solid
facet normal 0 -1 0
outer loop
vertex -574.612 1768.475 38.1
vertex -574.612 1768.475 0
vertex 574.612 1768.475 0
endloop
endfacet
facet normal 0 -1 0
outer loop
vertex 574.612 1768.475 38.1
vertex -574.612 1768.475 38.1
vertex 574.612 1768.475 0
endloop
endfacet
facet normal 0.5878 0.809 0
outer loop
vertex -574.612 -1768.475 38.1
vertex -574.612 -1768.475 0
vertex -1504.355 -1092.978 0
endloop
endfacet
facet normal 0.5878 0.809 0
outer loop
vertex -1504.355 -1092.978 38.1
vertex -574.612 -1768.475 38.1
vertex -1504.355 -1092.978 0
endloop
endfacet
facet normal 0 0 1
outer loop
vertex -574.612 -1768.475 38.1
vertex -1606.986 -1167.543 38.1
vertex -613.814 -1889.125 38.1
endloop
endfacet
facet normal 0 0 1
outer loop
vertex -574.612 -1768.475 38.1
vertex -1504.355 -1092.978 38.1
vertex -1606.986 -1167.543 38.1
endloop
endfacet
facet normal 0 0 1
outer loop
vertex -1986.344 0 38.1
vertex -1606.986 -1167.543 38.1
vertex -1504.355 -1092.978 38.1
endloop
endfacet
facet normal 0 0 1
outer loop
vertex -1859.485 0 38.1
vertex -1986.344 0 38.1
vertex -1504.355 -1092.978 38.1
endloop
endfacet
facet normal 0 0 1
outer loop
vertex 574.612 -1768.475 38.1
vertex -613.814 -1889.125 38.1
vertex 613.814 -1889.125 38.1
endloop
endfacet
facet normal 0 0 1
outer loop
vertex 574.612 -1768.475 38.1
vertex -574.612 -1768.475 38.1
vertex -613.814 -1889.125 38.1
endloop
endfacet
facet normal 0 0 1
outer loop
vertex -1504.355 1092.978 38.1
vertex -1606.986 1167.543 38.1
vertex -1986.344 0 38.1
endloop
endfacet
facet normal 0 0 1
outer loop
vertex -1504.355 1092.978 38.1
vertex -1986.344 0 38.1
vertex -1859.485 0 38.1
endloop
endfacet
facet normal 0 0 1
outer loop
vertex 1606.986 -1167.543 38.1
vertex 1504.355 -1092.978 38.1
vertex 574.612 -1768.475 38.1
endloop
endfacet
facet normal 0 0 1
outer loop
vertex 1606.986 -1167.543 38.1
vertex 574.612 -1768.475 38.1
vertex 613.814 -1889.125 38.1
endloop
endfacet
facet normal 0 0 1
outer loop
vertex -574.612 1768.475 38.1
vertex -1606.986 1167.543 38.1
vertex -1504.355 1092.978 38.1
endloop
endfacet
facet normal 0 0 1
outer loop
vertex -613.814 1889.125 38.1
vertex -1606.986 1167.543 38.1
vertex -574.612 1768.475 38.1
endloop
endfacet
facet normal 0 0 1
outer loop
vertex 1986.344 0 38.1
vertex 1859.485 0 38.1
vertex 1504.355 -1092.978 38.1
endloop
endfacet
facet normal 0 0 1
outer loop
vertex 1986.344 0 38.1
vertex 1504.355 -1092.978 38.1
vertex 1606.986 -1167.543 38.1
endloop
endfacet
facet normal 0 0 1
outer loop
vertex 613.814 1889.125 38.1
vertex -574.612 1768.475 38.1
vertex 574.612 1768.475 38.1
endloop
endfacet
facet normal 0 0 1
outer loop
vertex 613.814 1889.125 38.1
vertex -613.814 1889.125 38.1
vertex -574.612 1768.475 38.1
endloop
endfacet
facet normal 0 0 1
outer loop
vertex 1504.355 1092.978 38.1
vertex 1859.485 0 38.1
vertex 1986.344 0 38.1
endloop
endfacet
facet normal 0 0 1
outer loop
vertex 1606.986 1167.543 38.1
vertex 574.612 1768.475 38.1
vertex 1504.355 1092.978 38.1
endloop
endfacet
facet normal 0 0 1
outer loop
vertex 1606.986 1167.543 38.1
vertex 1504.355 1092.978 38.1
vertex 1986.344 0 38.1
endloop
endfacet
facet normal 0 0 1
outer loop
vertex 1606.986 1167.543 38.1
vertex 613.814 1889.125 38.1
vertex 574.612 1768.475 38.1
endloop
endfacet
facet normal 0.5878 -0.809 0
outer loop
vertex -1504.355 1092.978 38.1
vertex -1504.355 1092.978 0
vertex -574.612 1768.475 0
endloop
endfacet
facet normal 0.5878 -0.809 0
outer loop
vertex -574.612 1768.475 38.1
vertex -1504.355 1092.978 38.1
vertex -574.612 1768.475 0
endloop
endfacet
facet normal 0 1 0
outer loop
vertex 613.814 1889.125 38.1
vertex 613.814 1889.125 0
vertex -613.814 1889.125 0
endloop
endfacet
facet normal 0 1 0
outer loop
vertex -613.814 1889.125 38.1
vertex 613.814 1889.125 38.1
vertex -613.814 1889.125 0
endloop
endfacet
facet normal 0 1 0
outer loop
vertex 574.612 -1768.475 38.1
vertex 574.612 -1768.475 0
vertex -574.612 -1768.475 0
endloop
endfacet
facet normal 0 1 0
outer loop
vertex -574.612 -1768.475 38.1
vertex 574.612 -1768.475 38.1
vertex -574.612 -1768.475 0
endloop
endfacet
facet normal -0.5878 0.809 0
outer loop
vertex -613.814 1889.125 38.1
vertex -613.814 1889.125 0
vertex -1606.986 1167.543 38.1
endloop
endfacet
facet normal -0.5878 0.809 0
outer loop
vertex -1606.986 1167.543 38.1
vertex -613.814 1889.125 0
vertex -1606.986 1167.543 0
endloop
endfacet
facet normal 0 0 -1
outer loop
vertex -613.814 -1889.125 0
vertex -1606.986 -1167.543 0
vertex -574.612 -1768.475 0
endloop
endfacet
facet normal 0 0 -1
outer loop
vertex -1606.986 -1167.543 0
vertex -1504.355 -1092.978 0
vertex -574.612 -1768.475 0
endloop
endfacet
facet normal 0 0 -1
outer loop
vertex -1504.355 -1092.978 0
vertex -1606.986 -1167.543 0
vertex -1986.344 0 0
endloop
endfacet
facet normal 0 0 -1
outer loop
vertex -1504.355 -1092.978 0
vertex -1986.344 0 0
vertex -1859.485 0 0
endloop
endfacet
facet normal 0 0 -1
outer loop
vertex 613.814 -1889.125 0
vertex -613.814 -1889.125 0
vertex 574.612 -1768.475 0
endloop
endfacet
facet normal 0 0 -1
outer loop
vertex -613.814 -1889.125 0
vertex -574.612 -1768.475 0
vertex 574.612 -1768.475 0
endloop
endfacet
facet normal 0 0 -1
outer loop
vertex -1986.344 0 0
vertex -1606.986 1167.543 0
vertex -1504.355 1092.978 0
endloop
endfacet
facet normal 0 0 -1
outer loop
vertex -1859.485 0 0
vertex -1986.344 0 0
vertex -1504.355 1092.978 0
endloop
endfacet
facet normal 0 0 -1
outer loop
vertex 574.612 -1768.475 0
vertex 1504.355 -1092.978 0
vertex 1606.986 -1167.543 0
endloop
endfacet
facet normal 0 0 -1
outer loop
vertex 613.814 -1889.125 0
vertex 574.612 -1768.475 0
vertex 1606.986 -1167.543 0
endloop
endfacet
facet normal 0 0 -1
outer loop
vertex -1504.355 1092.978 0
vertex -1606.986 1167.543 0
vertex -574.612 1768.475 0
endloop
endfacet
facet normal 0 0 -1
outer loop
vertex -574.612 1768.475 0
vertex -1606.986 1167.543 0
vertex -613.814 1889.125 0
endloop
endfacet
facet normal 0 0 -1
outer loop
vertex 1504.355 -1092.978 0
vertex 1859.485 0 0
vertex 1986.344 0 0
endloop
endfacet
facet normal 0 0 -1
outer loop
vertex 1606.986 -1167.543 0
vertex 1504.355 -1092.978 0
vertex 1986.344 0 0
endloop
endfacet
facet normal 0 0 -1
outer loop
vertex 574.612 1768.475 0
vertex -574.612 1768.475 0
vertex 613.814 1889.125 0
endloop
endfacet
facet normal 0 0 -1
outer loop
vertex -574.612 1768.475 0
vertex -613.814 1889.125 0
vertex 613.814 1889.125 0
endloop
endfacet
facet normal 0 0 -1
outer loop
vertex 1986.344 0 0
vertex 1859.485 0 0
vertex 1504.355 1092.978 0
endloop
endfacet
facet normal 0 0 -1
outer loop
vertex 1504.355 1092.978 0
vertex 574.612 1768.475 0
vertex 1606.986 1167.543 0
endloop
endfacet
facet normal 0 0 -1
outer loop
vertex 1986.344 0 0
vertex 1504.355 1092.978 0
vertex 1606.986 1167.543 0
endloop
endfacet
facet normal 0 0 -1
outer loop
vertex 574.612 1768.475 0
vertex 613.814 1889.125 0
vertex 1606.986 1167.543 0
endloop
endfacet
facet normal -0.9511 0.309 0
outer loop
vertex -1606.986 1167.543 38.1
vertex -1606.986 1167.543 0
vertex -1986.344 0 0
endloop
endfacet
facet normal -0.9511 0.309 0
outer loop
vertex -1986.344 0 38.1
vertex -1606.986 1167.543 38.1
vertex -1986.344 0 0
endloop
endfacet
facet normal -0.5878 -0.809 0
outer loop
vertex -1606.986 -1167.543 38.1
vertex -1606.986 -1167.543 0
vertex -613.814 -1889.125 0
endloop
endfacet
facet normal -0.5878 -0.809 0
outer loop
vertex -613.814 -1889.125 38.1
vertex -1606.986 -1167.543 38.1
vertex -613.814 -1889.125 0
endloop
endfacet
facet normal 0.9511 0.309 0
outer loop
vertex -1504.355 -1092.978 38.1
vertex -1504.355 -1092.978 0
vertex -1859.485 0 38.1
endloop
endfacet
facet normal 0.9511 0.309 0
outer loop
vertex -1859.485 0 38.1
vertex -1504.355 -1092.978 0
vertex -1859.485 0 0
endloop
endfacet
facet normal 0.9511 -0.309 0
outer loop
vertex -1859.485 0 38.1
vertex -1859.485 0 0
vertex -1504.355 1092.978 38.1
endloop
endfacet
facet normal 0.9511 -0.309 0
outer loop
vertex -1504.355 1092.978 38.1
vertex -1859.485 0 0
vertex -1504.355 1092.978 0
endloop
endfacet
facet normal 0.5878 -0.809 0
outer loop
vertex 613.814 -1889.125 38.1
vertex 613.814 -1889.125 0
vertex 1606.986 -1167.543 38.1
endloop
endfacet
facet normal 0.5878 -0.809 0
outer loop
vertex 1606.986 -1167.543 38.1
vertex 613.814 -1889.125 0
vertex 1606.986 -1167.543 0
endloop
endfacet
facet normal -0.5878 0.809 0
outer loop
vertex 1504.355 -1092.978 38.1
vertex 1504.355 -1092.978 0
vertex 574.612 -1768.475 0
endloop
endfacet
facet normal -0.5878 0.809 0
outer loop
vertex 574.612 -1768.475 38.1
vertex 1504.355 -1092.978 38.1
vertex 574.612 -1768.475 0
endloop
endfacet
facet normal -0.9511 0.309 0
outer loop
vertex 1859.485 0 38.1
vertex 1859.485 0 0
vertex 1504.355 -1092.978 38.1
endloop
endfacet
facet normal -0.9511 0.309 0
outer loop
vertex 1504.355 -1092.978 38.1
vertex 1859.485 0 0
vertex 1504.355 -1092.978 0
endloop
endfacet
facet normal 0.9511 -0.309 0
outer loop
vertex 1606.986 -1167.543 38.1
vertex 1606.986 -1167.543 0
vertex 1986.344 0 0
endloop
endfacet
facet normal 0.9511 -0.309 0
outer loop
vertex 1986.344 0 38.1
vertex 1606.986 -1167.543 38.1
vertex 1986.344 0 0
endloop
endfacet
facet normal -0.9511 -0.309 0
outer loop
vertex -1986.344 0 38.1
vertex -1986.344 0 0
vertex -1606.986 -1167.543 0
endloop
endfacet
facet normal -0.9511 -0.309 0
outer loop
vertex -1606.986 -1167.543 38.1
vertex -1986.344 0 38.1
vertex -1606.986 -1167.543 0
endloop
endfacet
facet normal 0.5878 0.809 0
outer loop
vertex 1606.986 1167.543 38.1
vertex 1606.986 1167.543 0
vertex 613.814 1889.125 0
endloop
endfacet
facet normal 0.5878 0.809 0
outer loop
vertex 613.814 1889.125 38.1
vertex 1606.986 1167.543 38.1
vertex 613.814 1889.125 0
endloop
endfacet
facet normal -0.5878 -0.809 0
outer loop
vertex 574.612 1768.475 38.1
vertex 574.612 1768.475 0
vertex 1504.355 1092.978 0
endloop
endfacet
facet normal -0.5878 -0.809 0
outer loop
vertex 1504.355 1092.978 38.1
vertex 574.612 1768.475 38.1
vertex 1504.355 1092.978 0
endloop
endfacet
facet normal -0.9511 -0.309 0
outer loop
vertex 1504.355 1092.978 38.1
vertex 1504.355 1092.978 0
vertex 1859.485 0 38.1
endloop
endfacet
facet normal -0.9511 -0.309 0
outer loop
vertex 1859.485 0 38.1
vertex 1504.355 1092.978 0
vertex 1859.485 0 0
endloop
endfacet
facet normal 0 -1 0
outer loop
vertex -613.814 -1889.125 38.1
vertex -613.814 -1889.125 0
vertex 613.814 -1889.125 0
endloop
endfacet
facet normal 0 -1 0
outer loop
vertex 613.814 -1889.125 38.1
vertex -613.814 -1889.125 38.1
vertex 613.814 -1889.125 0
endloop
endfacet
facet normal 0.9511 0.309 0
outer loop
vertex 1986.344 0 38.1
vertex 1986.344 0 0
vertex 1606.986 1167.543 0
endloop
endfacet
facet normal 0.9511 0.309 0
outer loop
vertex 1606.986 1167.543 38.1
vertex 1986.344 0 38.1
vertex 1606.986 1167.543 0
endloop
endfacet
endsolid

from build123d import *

# Parameters (mm, degrees)
F1_DEPTH = 38.1


with BuildPart() as f1:
    # F0 (on Top) → F1 (new body)
    with BuildSketch(Plane.XY):
        Polygon((613.813921, 1889.125), (-613.813921, 1889.125), (-1606.985708, 1167.543459), (-1986.343574, 0), (-1606.985708, -1167.543459), (-613.813921, -1889.125), (613.813921, -1889.125), (1606.985708, -1167.543459), (1986.343574, 0), (1606.985708, 1167.543459), align=None)
        Polygon((-1504.354688, 1092.977658), (-574.61236, 1768.475), (574.61236, 1768.475), (1504.354688, 1092.977658), (1859.484657, 0), (1504.354688, -1092.977658), (574.61236, -1768.475), (-574.61236, -1768.475), (-1504.354688, -1092.977658), (-1859.484657, 0), align=None, mode=Mode.SUBTRACT)
    extrude(amount=F1_DEPTH)


solid = f1.part
